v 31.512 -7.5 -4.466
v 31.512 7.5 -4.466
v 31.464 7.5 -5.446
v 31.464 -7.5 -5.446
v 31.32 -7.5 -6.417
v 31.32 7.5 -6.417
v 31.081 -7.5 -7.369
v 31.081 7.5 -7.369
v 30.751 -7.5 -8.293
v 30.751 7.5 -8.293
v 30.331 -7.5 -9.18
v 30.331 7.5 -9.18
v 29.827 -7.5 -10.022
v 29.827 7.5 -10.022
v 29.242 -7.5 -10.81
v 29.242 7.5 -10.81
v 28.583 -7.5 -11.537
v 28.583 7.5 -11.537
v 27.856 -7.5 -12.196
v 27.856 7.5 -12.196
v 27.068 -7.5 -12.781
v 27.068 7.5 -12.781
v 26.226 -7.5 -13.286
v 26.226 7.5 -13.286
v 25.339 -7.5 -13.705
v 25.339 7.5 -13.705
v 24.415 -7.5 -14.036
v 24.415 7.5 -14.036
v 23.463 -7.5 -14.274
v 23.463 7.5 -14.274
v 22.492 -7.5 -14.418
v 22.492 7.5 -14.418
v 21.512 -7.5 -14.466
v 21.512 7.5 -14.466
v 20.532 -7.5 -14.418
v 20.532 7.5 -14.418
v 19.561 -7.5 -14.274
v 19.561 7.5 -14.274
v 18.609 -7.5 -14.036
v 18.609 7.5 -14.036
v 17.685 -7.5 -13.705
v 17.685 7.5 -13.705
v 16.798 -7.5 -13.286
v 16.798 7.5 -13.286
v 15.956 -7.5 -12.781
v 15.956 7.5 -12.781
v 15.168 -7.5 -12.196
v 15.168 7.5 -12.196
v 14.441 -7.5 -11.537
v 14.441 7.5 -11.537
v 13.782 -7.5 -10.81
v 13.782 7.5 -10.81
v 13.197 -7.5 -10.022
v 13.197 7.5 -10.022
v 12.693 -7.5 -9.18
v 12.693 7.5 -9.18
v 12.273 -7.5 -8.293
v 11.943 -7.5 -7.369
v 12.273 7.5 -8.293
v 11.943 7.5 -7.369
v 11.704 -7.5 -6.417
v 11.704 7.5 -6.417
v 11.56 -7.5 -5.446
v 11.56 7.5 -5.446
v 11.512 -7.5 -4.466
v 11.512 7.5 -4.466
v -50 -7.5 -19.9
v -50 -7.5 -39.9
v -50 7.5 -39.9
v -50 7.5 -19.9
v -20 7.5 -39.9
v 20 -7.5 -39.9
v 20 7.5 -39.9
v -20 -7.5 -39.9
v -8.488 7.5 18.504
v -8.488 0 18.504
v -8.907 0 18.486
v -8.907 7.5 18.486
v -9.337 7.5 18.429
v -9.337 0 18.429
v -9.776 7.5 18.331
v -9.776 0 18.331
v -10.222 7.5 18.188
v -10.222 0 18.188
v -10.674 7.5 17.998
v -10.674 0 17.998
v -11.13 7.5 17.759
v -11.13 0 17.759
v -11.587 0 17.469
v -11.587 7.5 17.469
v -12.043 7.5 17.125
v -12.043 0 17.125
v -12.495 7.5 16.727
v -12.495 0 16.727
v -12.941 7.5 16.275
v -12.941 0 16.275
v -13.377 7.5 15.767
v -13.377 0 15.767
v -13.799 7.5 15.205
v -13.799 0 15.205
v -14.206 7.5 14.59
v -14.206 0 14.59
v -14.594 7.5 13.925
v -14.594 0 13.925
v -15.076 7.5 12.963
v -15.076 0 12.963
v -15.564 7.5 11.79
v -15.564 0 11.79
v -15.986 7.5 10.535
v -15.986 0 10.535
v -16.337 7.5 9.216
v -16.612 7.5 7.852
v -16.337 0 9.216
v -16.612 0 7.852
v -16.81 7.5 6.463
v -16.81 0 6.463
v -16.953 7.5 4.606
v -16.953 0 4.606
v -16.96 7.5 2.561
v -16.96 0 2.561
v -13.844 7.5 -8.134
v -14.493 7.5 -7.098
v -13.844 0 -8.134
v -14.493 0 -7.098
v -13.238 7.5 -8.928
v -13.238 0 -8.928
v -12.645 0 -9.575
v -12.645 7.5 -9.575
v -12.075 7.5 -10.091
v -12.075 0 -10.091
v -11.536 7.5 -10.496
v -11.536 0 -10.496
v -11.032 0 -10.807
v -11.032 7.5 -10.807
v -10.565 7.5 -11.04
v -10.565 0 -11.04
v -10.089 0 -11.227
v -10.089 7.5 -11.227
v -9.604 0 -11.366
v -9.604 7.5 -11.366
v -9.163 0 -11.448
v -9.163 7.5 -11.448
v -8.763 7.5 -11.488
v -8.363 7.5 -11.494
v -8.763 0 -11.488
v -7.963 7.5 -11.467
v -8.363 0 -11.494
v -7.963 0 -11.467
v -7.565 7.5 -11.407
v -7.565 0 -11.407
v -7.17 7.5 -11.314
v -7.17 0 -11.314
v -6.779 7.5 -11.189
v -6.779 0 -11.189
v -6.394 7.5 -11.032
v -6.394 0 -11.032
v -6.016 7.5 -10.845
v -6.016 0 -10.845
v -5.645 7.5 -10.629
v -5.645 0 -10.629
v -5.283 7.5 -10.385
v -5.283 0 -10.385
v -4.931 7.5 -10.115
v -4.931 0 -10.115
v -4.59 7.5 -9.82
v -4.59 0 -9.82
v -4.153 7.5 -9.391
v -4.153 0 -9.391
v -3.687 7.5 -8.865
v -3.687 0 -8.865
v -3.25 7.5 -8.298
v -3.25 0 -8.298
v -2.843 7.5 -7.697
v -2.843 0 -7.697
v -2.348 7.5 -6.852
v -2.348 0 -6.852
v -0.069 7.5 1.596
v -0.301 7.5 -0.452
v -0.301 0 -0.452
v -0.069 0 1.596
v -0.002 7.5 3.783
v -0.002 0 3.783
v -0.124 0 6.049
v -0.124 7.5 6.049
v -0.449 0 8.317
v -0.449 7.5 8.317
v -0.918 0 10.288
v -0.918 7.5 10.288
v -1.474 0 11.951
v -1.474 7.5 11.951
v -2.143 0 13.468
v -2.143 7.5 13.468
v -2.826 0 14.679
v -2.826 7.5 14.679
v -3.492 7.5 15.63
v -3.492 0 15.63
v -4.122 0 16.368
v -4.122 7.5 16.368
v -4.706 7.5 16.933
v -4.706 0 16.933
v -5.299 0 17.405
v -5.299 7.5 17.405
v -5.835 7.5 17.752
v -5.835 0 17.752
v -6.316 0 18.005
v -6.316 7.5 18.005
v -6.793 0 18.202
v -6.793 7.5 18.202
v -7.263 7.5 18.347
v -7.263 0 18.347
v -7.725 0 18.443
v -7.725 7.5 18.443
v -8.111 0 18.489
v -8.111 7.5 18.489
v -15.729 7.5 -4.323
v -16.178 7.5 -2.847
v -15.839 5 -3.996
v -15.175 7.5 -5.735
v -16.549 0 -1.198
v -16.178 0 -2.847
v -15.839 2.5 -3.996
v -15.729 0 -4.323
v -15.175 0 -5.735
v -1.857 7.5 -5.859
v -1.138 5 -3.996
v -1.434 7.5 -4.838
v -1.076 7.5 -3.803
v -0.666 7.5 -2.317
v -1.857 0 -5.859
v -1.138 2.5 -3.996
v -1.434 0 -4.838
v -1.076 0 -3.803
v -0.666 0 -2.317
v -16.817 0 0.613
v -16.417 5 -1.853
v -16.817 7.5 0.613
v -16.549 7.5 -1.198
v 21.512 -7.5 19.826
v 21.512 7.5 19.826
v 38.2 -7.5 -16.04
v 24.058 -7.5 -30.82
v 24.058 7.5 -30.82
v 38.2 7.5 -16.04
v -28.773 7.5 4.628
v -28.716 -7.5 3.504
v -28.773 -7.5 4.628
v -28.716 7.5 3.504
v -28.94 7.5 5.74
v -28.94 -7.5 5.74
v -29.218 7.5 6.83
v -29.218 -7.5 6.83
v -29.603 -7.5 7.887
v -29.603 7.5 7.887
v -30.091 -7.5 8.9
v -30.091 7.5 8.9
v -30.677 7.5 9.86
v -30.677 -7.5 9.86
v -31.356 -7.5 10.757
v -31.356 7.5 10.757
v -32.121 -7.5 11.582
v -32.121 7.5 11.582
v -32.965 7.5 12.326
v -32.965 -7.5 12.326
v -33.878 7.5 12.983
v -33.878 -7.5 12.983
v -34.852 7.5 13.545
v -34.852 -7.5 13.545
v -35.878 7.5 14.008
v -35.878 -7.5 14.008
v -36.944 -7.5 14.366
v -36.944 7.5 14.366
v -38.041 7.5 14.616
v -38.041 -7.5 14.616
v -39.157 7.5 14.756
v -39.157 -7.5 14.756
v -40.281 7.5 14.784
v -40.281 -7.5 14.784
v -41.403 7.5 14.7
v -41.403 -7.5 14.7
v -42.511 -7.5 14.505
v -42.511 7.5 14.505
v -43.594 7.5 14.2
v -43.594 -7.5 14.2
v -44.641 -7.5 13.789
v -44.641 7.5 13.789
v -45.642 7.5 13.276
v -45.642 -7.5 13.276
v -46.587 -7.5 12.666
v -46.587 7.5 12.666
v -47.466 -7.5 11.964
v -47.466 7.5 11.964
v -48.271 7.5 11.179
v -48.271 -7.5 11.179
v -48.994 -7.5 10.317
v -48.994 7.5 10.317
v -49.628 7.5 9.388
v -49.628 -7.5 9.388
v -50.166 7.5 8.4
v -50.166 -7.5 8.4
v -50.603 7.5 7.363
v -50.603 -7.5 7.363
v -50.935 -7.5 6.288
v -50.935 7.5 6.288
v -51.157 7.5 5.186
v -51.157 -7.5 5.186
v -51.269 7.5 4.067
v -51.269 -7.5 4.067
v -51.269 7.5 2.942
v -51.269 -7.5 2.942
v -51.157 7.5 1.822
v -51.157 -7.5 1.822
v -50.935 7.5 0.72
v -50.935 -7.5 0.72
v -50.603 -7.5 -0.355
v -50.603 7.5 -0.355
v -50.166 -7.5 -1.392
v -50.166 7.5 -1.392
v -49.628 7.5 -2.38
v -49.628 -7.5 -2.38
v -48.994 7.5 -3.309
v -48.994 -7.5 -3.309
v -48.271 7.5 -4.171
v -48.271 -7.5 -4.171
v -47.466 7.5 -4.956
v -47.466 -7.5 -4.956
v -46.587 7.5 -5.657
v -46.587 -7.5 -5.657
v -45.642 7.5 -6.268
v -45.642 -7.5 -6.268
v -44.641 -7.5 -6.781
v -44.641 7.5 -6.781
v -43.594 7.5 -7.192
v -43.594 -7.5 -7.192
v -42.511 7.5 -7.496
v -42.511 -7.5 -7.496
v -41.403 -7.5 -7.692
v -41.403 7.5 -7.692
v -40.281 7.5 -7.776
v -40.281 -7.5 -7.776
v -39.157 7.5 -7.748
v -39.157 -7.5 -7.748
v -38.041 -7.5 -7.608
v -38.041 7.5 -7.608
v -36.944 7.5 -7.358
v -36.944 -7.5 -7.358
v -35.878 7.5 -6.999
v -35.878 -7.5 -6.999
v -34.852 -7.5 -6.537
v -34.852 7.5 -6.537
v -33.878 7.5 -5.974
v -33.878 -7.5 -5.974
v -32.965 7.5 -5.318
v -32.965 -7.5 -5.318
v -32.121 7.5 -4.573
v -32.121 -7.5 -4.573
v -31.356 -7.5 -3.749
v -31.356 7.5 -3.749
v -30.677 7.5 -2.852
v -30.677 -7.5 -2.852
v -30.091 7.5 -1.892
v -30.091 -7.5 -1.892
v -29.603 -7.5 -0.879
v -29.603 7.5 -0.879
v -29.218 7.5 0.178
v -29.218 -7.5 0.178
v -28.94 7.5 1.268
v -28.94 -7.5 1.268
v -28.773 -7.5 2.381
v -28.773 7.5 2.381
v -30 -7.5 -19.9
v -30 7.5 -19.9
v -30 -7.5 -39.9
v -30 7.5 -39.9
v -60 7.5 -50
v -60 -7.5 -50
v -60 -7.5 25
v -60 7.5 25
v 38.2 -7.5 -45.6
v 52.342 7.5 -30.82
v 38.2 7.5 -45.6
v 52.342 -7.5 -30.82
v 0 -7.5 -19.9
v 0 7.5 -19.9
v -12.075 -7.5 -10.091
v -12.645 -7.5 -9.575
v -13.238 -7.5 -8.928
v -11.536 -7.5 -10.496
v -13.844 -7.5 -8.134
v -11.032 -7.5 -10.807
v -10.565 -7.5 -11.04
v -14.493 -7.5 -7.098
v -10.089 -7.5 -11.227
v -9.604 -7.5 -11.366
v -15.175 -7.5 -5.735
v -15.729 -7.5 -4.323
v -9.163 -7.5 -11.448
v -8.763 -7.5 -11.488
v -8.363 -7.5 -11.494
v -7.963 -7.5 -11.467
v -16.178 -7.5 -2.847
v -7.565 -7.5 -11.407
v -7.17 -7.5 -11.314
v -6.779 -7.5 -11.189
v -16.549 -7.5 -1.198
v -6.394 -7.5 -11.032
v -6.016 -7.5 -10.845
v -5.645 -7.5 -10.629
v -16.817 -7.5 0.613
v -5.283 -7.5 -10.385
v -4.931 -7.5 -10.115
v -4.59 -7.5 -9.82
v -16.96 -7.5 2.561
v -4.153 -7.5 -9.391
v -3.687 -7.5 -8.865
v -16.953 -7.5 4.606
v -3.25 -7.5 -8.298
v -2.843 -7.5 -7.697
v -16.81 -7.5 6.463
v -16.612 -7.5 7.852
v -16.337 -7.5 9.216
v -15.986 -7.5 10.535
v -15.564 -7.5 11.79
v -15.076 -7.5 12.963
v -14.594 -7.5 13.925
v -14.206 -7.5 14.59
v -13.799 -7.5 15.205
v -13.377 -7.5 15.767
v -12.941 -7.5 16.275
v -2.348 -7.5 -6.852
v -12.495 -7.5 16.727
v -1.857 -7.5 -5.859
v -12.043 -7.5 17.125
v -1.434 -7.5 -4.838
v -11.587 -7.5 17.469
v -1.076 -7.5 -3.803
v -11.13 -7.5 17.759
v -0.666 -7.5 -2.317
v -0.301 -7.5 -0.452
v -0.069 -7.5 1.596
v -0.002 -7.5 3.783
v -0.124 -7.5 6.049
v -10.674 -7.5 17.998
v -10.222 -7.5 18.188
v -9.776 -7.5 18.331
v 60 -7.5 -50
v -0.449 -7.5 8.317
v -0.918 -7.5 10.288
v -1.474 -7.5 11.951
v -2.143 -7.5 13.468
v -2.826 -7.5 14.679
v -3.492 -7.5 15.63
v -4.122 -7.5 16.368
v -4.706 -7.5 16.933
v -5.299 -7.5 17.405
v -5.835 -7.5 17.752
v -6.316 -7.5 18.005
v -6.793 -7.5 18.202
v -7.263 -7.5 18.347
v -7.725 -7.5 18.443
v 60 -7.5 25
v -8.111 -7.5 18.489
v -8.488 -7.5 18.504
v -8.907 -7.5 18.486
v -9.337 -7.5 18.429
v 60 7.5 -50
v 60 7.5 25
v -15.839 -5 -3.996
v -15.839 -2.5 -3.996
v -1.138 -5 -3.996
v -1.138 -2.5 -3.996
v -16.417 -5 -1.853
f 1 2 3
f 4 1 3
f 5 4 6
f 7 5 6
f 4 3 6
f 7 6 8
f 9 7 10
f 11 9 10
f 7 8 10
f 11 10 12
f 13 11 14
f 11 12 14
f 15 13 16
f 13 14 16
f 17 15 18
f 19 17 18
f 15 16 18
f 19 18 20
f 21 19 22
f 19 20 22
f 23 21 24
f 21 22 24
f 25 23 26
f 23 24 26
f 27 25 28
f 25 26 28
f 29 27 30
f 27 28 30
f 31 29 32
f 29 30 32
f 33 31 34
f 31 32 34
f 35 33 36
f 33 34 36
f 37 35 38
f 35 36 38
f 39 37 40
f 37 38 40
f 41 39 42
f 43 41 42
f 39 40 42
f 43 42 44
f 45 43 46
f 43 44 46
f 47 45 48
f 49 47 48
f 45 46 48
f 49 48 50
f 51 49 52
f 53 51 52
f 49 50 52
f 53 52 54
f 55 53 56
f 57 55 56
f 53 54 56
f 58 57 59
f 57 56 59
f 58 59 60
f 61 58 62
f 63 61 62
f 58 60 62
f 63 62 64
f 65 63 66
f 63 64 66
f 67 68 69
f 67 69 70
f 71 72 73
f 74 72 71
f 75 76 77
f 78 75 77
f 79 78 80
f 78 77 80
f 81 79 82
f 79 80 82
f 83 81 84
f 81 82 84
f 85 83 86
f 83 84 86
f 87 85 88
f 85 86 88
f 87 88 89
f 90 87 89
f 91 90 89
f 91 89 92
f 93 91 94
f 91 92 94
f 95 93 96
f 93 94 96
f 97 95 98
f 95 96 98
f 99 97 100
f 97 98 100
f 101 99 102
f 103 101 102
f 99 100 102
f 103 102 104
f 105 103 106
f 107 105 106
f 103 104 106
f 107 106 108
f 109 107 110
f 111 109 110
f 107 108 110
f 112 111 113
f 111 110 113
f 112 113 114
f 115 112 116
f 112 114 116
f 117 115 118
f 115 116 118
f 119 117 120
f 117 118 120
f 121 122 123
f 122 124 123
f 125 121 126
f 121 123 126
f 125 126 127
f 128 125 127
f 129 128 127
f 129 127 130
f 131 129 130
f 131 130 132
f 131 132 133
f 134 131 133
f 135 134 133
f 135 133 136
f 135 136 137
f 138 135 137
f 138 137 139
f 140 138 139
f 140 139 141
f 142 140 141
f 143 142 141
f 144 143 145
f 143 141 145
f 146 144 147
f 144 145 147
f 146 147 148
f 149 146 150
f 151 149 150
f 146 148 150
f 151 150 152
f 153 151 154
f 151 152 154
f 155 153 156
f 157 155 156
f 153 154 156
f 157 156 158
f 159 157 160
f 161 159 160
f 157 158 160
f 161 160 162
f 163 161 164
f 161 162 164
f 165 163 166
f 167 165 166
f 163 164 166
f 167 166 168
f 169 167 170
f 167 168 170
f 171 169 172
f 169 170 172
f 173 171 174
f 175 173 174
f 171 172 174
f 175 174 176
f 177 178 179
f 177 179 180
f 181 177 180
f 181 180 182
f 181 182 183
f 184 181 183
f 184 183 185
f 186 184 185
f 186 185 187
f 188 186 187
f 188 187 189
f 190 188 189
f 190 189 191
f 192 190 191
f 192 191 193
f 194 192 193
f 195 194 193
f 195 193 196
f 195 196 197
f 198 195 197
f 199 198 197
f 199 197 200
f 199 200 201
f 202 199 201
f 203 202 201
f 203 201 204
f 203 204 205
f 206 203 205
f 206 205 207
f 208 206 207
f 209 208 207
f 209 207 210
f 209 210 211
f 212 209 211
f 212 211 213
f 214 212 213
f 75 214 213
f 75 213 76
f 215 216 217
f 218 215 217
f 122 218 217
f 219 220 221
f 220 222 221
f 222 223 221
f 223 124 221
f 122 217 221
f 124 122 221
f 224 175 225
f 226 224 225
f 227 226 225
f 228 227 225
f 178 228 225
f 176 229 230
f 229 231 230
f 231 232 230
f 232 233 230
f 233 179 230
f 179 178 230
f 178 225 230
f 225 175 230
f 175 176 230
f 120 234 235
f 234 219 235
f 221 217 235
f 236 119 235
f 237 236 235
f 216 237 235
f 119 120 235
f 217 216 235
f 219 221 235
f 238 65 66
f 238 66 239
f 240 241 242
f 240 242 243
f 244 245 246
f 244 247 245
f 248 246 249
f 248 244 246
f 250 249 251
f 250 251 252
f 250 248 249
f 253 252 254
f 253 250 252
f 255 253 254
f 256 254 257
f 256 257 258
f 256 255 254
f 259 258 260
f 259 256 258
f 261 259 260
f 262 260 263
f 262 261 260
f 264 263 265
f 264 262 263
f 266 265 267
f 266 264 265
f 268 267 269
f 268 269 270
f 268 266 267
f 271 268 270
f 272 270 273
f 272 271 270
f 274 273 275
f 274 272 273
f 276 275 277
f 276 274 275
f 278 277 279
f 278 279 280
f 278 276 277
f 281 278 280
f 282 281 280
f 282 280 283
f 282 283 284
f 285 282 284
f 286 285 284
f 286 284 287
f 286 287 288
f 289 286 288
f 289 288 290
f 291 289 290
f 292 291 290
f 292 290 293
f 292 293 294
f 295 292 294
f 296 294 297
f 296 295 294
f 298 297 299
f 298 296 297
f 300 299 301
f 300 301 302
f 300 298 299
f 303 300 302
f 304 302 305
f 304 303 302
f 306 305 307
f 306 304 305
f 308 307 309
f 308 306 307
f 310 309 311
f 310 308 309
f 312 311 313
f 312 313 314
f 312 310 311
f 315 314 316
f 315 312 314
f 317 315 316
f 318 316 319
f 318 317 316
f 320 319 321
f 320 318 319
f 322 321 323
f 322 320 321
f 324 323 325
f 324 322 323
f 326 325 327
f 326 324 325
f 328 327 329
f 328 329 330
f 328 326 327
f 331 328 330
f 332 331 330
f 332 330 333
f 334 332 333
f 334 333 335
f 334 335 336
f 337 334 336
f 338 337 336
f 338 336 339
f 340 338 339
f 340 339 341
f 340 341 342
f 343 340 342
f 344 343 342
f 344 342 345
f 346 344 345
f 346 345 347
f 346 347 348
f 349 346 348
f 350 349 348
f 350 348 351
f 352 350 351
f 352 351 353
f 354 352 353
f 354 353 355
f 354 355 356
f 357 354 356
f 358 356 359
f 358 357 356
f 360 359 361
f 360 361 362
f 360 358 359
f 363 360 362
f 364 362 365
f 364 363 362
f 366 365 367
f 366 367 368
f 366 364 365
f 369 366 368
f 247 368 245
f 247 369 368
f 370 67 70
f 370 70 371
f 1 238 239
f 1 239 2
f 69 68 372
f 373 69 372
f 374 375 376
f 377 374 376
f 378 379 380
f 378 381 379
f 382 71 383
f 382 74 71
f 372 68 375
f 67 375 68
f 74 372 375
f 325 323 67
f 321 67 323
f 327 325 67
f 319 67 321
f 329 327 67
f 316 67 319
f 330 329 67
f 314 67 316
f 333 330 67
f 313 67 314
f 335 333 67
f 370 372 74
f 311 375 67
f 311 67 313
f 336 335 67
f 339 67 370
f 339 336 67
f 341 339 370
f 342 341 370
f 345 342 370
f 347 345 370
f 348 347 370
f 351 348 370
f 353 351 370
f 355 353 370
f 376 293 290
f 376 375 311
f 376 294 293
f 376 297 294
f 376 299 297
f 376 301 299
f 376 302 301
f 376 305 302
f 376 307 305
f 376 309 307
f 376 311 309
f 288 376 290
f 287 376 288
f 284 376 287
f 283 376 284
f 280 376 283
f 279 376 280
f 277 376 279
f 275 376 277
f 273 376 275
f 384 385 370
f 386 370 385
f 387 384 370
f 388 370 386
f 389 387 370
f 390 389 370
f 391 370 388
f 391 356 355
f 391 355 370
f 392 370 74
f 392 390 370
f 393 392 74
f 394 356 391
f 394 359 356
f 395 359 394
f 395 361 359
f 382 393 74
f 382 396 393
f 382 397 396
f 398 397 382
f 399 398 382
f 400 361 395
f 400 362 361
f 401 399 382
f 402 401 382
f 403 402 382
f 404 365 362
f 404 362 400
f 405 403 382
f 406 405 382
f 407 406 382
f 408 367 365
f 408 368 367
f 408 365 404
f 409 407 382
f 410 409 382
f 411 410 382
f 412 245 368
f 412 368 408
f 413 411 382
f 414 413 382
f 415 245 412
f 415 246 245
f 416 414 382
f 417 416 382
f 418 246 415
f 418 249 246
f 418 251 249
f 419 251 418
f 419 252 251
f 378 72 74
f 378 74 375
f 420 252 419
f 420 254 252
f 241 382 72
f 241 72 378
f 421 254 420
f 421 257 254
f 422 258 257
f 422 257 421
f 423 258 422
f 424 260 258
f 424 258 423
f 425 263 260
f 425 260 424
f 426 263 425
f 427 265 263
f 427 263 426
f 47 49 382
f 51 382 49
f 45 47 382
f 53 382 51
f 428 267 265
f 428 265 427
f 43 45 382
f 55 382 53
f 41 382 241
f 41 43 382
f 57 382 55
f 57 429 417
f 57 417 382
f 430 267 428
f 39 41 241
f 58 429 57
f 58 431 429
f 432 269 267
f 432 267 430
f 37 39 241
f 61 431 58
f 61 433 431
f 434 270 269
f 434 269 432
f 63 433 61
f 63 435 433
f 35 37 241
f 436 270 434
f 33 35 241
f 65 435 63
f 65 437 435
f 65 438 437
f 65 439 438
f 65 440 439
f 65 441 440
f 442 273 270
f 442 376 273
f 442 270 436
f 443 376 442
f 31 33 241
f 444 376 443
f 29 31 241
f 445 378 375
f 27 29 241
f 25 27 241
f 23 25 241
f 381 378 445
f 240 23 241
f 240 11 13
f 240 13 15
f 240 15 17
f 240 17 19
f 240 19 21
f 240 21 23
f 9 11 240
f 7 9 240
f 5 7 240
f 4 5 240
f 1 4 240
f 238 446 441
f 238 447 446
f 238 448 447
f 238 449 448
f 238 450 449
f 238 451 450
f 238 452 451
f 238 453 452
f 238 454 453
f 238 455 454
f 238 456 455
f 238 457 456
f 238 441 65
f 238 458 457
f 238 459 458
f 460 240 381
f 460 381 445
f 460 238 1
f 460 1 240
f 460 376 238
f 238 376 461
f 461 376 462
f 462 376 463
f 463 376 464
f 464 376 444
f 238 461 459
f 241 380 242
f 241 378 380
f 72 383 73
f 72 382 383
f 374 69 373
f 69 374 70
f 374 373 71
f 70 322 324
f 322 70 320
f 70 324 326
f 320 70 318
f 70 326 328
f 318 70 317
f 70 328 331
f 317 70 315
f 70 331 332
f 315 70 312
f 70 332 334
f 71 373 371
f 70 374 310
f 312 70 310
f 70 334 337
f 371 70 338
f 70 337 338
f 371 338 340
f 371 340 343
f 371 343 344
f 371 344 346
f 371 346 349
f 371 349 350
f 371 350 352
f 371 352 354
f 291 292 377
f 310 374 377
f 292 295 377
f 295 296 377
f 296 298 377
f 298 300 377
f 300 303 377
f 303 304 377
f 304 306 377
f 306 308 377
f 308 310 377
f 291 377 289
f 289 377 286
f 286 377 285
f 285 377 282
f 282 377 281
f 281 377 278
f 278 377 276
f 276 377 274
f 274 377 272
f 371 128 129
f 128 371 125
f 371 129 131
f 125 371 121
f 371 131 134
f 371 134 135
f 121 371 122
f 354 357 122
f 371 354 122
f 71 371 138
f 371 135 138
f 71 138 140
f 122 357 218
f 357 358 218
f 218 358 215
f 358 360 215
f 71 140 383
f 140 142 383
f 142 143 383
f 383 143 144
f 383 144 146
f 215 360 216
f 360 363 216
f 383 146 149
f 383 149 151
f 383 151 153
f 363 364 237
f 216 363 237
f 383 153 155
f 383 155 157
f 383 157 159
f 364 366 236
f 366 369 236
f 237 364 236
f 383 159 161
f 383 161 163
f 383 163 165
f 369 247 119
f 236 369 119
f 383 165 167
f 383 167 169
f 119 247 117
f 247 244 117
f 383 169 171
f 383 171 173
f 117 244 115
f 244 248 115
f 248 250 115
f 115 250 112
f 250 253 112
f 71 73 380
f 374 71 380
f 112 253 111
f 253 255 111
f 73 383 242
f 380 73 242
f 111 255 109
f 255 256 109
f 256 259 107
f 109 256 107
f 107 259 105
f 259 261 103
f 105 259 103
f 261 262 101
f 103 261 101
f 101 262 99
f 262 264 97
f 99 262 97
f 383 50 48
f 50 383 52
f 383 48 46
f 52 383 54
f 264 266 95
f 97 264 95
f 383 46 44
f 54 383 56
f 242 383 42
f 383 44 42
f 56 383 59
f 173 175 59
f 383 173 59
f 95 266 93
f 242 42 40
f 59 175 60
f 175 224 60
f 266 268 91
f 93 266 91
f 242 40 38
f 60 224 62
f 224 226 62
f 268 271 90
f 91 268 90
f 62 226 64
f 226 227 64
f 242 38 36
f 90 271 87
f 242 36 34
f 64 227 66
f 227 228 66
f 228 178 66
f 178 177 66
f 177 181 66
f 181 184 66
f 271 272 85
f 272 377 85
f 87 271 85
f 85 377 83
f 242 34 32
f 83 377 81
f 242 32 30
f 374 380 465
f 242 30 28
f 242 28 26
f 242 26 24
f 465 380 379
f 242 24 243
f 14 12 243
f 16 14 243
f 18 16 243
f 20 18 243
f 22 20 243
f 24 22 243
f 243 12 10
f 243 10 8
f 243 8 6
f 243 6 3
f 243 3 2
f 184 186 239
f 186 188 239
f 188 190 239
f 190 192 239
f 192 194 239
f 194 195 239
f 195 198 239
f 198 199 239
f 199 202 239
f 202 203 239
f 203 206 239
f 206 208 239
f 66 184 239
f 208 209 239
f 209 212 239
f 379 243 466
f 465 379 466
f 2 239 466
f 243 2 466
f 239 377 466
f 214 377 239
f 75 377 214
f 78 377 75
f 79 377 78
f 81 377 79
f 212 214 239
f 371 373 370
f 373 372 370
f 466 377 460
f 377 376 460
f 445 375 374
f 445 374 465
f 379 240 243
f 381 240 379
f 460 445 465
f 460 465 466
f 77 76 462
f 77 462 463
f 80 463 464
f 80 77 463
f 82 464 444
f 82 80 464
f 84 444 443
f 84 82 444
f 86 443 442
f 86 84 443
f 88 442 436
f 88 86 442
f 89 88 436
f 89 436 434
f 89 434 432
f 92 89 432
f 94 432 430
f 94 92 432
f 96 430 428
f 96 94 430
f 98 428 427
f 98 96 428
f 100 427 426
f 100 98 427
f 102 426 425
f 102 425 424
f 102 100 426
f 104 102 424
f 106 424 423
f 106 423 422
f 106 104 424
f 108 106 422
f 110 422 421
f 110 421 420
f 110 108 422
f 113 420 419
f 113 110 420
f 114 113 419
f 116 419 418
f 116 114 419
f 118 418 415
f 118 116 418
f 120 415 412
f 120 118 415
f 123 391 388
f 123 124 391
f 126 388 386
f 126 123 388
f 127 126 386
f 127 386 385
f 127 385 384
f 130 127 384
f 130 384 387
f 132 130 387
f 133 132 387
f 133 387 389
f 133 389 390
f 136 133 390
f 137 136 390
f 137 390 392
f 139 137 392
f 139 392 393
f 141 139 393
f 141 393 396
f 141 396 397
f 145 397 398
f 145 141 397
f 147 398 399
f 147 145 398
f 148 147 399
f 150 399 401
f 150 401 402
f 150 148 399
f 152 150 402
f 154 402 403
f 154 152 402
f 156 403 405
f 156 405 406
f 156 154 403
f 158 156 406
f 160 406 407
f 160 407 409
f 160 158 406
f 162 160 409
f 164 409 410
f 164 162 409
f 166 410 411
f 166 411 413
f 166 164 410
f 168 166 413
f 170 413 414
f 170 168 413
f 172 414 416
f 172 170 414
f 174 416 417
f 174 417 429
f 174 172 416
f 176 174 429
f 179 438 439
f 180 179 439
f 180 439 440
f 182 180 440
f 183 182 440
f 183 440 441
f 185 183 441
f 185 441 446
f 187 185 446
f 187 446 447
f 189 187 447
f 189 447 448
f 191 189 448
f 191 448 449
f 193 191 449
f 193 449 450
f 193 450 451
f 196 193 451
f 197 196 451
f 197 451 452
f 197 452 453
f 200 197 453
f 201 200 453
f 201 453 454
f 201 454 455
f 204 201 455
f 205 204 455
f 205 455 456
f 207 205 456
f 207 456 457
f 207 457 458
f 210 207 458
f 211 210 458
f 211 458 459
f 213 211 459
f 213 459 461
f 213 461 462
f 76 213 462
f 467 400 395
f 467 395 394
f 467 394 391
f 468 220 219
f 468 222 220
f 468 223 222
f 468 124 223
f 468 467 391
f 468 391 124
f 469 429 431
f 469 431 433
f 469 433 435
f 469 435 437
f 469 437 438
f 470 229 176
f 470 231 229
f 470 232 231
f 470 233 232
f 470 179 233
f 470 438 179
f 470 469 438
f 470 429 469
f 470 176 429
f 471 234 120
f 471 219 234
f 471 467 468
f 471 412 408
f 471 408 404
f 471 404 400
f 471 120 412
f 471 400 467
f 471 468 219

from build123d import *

# Parameters (mm, degrees)
F0_W     = 120
F0_H     = 75
F0_W_2   = 20
F0_H_2   = 20
F0_R     = 11.2835
F1_DEPTH = 7.5


with BuildPart() as f1:
    # F0 (on Front) → F1 (new body, symmetric)
    with BuildSketch(Plane.XZ):
        with Locations((0, -12.5)):
            Rectangle(F0_W, F0_H)
        with Locations((-40.000001, -29.899994)):
            Rectangle(F0_W_2, F0_H_2, mode=Mode.SUBTRACT)
        Polygon((19.999999, -39.899994), (-1e-06, -39.899994), (-20.000001, -39.899994), (-1e-06, -19.899994), align=None, mode=Mode.SUBTRACT)
        Polygon((24.057998, -30.820105), (38.199998, -16.040212), (52.341998, -30.820105), (38.199998, -45.599997), align=None, mode=Mode.SUBTRACT)
        with Locations((-39.999999, 3.504108)):
            Circle(F0_R, mode=Mode.SUBTRACT)
        with BuildLine():
            add(Edge.make_bspline(
                [(-8.488411, 18.504108), (-23.190058, 18.504108), (-15.839235, -3.995892), (-8.488411, -26.495892), (-1.137588, -3.995892), (6.213236, 18.504108), (-8.488411, 18.504108)],
                knots=[0, 0, 0, 2.094395, 2.094395, 4.18879, 4.18879, 6.283185, 6.283185, 6.283185], degree=2, weights=[1, 0.5, 1, 0.5, 1, 0.5, 1]))
        make_face(mode=Mode.SUBTRACT)
        with BuildLine():
            ThreePointArc((31.512001, -4.466328), (21.512001, -14.466328), (11.512001, -4.466328))
            Line((11.512001, -4.466328), (21.512001, 19.825672))
            Line((21.512001, 19.825672), (31.512001, -4.466328))
        make_face(mode=Mode.SUBTRACT)
    extrude(amount=F1_DEPTH, both=True)


solid = f1.part
